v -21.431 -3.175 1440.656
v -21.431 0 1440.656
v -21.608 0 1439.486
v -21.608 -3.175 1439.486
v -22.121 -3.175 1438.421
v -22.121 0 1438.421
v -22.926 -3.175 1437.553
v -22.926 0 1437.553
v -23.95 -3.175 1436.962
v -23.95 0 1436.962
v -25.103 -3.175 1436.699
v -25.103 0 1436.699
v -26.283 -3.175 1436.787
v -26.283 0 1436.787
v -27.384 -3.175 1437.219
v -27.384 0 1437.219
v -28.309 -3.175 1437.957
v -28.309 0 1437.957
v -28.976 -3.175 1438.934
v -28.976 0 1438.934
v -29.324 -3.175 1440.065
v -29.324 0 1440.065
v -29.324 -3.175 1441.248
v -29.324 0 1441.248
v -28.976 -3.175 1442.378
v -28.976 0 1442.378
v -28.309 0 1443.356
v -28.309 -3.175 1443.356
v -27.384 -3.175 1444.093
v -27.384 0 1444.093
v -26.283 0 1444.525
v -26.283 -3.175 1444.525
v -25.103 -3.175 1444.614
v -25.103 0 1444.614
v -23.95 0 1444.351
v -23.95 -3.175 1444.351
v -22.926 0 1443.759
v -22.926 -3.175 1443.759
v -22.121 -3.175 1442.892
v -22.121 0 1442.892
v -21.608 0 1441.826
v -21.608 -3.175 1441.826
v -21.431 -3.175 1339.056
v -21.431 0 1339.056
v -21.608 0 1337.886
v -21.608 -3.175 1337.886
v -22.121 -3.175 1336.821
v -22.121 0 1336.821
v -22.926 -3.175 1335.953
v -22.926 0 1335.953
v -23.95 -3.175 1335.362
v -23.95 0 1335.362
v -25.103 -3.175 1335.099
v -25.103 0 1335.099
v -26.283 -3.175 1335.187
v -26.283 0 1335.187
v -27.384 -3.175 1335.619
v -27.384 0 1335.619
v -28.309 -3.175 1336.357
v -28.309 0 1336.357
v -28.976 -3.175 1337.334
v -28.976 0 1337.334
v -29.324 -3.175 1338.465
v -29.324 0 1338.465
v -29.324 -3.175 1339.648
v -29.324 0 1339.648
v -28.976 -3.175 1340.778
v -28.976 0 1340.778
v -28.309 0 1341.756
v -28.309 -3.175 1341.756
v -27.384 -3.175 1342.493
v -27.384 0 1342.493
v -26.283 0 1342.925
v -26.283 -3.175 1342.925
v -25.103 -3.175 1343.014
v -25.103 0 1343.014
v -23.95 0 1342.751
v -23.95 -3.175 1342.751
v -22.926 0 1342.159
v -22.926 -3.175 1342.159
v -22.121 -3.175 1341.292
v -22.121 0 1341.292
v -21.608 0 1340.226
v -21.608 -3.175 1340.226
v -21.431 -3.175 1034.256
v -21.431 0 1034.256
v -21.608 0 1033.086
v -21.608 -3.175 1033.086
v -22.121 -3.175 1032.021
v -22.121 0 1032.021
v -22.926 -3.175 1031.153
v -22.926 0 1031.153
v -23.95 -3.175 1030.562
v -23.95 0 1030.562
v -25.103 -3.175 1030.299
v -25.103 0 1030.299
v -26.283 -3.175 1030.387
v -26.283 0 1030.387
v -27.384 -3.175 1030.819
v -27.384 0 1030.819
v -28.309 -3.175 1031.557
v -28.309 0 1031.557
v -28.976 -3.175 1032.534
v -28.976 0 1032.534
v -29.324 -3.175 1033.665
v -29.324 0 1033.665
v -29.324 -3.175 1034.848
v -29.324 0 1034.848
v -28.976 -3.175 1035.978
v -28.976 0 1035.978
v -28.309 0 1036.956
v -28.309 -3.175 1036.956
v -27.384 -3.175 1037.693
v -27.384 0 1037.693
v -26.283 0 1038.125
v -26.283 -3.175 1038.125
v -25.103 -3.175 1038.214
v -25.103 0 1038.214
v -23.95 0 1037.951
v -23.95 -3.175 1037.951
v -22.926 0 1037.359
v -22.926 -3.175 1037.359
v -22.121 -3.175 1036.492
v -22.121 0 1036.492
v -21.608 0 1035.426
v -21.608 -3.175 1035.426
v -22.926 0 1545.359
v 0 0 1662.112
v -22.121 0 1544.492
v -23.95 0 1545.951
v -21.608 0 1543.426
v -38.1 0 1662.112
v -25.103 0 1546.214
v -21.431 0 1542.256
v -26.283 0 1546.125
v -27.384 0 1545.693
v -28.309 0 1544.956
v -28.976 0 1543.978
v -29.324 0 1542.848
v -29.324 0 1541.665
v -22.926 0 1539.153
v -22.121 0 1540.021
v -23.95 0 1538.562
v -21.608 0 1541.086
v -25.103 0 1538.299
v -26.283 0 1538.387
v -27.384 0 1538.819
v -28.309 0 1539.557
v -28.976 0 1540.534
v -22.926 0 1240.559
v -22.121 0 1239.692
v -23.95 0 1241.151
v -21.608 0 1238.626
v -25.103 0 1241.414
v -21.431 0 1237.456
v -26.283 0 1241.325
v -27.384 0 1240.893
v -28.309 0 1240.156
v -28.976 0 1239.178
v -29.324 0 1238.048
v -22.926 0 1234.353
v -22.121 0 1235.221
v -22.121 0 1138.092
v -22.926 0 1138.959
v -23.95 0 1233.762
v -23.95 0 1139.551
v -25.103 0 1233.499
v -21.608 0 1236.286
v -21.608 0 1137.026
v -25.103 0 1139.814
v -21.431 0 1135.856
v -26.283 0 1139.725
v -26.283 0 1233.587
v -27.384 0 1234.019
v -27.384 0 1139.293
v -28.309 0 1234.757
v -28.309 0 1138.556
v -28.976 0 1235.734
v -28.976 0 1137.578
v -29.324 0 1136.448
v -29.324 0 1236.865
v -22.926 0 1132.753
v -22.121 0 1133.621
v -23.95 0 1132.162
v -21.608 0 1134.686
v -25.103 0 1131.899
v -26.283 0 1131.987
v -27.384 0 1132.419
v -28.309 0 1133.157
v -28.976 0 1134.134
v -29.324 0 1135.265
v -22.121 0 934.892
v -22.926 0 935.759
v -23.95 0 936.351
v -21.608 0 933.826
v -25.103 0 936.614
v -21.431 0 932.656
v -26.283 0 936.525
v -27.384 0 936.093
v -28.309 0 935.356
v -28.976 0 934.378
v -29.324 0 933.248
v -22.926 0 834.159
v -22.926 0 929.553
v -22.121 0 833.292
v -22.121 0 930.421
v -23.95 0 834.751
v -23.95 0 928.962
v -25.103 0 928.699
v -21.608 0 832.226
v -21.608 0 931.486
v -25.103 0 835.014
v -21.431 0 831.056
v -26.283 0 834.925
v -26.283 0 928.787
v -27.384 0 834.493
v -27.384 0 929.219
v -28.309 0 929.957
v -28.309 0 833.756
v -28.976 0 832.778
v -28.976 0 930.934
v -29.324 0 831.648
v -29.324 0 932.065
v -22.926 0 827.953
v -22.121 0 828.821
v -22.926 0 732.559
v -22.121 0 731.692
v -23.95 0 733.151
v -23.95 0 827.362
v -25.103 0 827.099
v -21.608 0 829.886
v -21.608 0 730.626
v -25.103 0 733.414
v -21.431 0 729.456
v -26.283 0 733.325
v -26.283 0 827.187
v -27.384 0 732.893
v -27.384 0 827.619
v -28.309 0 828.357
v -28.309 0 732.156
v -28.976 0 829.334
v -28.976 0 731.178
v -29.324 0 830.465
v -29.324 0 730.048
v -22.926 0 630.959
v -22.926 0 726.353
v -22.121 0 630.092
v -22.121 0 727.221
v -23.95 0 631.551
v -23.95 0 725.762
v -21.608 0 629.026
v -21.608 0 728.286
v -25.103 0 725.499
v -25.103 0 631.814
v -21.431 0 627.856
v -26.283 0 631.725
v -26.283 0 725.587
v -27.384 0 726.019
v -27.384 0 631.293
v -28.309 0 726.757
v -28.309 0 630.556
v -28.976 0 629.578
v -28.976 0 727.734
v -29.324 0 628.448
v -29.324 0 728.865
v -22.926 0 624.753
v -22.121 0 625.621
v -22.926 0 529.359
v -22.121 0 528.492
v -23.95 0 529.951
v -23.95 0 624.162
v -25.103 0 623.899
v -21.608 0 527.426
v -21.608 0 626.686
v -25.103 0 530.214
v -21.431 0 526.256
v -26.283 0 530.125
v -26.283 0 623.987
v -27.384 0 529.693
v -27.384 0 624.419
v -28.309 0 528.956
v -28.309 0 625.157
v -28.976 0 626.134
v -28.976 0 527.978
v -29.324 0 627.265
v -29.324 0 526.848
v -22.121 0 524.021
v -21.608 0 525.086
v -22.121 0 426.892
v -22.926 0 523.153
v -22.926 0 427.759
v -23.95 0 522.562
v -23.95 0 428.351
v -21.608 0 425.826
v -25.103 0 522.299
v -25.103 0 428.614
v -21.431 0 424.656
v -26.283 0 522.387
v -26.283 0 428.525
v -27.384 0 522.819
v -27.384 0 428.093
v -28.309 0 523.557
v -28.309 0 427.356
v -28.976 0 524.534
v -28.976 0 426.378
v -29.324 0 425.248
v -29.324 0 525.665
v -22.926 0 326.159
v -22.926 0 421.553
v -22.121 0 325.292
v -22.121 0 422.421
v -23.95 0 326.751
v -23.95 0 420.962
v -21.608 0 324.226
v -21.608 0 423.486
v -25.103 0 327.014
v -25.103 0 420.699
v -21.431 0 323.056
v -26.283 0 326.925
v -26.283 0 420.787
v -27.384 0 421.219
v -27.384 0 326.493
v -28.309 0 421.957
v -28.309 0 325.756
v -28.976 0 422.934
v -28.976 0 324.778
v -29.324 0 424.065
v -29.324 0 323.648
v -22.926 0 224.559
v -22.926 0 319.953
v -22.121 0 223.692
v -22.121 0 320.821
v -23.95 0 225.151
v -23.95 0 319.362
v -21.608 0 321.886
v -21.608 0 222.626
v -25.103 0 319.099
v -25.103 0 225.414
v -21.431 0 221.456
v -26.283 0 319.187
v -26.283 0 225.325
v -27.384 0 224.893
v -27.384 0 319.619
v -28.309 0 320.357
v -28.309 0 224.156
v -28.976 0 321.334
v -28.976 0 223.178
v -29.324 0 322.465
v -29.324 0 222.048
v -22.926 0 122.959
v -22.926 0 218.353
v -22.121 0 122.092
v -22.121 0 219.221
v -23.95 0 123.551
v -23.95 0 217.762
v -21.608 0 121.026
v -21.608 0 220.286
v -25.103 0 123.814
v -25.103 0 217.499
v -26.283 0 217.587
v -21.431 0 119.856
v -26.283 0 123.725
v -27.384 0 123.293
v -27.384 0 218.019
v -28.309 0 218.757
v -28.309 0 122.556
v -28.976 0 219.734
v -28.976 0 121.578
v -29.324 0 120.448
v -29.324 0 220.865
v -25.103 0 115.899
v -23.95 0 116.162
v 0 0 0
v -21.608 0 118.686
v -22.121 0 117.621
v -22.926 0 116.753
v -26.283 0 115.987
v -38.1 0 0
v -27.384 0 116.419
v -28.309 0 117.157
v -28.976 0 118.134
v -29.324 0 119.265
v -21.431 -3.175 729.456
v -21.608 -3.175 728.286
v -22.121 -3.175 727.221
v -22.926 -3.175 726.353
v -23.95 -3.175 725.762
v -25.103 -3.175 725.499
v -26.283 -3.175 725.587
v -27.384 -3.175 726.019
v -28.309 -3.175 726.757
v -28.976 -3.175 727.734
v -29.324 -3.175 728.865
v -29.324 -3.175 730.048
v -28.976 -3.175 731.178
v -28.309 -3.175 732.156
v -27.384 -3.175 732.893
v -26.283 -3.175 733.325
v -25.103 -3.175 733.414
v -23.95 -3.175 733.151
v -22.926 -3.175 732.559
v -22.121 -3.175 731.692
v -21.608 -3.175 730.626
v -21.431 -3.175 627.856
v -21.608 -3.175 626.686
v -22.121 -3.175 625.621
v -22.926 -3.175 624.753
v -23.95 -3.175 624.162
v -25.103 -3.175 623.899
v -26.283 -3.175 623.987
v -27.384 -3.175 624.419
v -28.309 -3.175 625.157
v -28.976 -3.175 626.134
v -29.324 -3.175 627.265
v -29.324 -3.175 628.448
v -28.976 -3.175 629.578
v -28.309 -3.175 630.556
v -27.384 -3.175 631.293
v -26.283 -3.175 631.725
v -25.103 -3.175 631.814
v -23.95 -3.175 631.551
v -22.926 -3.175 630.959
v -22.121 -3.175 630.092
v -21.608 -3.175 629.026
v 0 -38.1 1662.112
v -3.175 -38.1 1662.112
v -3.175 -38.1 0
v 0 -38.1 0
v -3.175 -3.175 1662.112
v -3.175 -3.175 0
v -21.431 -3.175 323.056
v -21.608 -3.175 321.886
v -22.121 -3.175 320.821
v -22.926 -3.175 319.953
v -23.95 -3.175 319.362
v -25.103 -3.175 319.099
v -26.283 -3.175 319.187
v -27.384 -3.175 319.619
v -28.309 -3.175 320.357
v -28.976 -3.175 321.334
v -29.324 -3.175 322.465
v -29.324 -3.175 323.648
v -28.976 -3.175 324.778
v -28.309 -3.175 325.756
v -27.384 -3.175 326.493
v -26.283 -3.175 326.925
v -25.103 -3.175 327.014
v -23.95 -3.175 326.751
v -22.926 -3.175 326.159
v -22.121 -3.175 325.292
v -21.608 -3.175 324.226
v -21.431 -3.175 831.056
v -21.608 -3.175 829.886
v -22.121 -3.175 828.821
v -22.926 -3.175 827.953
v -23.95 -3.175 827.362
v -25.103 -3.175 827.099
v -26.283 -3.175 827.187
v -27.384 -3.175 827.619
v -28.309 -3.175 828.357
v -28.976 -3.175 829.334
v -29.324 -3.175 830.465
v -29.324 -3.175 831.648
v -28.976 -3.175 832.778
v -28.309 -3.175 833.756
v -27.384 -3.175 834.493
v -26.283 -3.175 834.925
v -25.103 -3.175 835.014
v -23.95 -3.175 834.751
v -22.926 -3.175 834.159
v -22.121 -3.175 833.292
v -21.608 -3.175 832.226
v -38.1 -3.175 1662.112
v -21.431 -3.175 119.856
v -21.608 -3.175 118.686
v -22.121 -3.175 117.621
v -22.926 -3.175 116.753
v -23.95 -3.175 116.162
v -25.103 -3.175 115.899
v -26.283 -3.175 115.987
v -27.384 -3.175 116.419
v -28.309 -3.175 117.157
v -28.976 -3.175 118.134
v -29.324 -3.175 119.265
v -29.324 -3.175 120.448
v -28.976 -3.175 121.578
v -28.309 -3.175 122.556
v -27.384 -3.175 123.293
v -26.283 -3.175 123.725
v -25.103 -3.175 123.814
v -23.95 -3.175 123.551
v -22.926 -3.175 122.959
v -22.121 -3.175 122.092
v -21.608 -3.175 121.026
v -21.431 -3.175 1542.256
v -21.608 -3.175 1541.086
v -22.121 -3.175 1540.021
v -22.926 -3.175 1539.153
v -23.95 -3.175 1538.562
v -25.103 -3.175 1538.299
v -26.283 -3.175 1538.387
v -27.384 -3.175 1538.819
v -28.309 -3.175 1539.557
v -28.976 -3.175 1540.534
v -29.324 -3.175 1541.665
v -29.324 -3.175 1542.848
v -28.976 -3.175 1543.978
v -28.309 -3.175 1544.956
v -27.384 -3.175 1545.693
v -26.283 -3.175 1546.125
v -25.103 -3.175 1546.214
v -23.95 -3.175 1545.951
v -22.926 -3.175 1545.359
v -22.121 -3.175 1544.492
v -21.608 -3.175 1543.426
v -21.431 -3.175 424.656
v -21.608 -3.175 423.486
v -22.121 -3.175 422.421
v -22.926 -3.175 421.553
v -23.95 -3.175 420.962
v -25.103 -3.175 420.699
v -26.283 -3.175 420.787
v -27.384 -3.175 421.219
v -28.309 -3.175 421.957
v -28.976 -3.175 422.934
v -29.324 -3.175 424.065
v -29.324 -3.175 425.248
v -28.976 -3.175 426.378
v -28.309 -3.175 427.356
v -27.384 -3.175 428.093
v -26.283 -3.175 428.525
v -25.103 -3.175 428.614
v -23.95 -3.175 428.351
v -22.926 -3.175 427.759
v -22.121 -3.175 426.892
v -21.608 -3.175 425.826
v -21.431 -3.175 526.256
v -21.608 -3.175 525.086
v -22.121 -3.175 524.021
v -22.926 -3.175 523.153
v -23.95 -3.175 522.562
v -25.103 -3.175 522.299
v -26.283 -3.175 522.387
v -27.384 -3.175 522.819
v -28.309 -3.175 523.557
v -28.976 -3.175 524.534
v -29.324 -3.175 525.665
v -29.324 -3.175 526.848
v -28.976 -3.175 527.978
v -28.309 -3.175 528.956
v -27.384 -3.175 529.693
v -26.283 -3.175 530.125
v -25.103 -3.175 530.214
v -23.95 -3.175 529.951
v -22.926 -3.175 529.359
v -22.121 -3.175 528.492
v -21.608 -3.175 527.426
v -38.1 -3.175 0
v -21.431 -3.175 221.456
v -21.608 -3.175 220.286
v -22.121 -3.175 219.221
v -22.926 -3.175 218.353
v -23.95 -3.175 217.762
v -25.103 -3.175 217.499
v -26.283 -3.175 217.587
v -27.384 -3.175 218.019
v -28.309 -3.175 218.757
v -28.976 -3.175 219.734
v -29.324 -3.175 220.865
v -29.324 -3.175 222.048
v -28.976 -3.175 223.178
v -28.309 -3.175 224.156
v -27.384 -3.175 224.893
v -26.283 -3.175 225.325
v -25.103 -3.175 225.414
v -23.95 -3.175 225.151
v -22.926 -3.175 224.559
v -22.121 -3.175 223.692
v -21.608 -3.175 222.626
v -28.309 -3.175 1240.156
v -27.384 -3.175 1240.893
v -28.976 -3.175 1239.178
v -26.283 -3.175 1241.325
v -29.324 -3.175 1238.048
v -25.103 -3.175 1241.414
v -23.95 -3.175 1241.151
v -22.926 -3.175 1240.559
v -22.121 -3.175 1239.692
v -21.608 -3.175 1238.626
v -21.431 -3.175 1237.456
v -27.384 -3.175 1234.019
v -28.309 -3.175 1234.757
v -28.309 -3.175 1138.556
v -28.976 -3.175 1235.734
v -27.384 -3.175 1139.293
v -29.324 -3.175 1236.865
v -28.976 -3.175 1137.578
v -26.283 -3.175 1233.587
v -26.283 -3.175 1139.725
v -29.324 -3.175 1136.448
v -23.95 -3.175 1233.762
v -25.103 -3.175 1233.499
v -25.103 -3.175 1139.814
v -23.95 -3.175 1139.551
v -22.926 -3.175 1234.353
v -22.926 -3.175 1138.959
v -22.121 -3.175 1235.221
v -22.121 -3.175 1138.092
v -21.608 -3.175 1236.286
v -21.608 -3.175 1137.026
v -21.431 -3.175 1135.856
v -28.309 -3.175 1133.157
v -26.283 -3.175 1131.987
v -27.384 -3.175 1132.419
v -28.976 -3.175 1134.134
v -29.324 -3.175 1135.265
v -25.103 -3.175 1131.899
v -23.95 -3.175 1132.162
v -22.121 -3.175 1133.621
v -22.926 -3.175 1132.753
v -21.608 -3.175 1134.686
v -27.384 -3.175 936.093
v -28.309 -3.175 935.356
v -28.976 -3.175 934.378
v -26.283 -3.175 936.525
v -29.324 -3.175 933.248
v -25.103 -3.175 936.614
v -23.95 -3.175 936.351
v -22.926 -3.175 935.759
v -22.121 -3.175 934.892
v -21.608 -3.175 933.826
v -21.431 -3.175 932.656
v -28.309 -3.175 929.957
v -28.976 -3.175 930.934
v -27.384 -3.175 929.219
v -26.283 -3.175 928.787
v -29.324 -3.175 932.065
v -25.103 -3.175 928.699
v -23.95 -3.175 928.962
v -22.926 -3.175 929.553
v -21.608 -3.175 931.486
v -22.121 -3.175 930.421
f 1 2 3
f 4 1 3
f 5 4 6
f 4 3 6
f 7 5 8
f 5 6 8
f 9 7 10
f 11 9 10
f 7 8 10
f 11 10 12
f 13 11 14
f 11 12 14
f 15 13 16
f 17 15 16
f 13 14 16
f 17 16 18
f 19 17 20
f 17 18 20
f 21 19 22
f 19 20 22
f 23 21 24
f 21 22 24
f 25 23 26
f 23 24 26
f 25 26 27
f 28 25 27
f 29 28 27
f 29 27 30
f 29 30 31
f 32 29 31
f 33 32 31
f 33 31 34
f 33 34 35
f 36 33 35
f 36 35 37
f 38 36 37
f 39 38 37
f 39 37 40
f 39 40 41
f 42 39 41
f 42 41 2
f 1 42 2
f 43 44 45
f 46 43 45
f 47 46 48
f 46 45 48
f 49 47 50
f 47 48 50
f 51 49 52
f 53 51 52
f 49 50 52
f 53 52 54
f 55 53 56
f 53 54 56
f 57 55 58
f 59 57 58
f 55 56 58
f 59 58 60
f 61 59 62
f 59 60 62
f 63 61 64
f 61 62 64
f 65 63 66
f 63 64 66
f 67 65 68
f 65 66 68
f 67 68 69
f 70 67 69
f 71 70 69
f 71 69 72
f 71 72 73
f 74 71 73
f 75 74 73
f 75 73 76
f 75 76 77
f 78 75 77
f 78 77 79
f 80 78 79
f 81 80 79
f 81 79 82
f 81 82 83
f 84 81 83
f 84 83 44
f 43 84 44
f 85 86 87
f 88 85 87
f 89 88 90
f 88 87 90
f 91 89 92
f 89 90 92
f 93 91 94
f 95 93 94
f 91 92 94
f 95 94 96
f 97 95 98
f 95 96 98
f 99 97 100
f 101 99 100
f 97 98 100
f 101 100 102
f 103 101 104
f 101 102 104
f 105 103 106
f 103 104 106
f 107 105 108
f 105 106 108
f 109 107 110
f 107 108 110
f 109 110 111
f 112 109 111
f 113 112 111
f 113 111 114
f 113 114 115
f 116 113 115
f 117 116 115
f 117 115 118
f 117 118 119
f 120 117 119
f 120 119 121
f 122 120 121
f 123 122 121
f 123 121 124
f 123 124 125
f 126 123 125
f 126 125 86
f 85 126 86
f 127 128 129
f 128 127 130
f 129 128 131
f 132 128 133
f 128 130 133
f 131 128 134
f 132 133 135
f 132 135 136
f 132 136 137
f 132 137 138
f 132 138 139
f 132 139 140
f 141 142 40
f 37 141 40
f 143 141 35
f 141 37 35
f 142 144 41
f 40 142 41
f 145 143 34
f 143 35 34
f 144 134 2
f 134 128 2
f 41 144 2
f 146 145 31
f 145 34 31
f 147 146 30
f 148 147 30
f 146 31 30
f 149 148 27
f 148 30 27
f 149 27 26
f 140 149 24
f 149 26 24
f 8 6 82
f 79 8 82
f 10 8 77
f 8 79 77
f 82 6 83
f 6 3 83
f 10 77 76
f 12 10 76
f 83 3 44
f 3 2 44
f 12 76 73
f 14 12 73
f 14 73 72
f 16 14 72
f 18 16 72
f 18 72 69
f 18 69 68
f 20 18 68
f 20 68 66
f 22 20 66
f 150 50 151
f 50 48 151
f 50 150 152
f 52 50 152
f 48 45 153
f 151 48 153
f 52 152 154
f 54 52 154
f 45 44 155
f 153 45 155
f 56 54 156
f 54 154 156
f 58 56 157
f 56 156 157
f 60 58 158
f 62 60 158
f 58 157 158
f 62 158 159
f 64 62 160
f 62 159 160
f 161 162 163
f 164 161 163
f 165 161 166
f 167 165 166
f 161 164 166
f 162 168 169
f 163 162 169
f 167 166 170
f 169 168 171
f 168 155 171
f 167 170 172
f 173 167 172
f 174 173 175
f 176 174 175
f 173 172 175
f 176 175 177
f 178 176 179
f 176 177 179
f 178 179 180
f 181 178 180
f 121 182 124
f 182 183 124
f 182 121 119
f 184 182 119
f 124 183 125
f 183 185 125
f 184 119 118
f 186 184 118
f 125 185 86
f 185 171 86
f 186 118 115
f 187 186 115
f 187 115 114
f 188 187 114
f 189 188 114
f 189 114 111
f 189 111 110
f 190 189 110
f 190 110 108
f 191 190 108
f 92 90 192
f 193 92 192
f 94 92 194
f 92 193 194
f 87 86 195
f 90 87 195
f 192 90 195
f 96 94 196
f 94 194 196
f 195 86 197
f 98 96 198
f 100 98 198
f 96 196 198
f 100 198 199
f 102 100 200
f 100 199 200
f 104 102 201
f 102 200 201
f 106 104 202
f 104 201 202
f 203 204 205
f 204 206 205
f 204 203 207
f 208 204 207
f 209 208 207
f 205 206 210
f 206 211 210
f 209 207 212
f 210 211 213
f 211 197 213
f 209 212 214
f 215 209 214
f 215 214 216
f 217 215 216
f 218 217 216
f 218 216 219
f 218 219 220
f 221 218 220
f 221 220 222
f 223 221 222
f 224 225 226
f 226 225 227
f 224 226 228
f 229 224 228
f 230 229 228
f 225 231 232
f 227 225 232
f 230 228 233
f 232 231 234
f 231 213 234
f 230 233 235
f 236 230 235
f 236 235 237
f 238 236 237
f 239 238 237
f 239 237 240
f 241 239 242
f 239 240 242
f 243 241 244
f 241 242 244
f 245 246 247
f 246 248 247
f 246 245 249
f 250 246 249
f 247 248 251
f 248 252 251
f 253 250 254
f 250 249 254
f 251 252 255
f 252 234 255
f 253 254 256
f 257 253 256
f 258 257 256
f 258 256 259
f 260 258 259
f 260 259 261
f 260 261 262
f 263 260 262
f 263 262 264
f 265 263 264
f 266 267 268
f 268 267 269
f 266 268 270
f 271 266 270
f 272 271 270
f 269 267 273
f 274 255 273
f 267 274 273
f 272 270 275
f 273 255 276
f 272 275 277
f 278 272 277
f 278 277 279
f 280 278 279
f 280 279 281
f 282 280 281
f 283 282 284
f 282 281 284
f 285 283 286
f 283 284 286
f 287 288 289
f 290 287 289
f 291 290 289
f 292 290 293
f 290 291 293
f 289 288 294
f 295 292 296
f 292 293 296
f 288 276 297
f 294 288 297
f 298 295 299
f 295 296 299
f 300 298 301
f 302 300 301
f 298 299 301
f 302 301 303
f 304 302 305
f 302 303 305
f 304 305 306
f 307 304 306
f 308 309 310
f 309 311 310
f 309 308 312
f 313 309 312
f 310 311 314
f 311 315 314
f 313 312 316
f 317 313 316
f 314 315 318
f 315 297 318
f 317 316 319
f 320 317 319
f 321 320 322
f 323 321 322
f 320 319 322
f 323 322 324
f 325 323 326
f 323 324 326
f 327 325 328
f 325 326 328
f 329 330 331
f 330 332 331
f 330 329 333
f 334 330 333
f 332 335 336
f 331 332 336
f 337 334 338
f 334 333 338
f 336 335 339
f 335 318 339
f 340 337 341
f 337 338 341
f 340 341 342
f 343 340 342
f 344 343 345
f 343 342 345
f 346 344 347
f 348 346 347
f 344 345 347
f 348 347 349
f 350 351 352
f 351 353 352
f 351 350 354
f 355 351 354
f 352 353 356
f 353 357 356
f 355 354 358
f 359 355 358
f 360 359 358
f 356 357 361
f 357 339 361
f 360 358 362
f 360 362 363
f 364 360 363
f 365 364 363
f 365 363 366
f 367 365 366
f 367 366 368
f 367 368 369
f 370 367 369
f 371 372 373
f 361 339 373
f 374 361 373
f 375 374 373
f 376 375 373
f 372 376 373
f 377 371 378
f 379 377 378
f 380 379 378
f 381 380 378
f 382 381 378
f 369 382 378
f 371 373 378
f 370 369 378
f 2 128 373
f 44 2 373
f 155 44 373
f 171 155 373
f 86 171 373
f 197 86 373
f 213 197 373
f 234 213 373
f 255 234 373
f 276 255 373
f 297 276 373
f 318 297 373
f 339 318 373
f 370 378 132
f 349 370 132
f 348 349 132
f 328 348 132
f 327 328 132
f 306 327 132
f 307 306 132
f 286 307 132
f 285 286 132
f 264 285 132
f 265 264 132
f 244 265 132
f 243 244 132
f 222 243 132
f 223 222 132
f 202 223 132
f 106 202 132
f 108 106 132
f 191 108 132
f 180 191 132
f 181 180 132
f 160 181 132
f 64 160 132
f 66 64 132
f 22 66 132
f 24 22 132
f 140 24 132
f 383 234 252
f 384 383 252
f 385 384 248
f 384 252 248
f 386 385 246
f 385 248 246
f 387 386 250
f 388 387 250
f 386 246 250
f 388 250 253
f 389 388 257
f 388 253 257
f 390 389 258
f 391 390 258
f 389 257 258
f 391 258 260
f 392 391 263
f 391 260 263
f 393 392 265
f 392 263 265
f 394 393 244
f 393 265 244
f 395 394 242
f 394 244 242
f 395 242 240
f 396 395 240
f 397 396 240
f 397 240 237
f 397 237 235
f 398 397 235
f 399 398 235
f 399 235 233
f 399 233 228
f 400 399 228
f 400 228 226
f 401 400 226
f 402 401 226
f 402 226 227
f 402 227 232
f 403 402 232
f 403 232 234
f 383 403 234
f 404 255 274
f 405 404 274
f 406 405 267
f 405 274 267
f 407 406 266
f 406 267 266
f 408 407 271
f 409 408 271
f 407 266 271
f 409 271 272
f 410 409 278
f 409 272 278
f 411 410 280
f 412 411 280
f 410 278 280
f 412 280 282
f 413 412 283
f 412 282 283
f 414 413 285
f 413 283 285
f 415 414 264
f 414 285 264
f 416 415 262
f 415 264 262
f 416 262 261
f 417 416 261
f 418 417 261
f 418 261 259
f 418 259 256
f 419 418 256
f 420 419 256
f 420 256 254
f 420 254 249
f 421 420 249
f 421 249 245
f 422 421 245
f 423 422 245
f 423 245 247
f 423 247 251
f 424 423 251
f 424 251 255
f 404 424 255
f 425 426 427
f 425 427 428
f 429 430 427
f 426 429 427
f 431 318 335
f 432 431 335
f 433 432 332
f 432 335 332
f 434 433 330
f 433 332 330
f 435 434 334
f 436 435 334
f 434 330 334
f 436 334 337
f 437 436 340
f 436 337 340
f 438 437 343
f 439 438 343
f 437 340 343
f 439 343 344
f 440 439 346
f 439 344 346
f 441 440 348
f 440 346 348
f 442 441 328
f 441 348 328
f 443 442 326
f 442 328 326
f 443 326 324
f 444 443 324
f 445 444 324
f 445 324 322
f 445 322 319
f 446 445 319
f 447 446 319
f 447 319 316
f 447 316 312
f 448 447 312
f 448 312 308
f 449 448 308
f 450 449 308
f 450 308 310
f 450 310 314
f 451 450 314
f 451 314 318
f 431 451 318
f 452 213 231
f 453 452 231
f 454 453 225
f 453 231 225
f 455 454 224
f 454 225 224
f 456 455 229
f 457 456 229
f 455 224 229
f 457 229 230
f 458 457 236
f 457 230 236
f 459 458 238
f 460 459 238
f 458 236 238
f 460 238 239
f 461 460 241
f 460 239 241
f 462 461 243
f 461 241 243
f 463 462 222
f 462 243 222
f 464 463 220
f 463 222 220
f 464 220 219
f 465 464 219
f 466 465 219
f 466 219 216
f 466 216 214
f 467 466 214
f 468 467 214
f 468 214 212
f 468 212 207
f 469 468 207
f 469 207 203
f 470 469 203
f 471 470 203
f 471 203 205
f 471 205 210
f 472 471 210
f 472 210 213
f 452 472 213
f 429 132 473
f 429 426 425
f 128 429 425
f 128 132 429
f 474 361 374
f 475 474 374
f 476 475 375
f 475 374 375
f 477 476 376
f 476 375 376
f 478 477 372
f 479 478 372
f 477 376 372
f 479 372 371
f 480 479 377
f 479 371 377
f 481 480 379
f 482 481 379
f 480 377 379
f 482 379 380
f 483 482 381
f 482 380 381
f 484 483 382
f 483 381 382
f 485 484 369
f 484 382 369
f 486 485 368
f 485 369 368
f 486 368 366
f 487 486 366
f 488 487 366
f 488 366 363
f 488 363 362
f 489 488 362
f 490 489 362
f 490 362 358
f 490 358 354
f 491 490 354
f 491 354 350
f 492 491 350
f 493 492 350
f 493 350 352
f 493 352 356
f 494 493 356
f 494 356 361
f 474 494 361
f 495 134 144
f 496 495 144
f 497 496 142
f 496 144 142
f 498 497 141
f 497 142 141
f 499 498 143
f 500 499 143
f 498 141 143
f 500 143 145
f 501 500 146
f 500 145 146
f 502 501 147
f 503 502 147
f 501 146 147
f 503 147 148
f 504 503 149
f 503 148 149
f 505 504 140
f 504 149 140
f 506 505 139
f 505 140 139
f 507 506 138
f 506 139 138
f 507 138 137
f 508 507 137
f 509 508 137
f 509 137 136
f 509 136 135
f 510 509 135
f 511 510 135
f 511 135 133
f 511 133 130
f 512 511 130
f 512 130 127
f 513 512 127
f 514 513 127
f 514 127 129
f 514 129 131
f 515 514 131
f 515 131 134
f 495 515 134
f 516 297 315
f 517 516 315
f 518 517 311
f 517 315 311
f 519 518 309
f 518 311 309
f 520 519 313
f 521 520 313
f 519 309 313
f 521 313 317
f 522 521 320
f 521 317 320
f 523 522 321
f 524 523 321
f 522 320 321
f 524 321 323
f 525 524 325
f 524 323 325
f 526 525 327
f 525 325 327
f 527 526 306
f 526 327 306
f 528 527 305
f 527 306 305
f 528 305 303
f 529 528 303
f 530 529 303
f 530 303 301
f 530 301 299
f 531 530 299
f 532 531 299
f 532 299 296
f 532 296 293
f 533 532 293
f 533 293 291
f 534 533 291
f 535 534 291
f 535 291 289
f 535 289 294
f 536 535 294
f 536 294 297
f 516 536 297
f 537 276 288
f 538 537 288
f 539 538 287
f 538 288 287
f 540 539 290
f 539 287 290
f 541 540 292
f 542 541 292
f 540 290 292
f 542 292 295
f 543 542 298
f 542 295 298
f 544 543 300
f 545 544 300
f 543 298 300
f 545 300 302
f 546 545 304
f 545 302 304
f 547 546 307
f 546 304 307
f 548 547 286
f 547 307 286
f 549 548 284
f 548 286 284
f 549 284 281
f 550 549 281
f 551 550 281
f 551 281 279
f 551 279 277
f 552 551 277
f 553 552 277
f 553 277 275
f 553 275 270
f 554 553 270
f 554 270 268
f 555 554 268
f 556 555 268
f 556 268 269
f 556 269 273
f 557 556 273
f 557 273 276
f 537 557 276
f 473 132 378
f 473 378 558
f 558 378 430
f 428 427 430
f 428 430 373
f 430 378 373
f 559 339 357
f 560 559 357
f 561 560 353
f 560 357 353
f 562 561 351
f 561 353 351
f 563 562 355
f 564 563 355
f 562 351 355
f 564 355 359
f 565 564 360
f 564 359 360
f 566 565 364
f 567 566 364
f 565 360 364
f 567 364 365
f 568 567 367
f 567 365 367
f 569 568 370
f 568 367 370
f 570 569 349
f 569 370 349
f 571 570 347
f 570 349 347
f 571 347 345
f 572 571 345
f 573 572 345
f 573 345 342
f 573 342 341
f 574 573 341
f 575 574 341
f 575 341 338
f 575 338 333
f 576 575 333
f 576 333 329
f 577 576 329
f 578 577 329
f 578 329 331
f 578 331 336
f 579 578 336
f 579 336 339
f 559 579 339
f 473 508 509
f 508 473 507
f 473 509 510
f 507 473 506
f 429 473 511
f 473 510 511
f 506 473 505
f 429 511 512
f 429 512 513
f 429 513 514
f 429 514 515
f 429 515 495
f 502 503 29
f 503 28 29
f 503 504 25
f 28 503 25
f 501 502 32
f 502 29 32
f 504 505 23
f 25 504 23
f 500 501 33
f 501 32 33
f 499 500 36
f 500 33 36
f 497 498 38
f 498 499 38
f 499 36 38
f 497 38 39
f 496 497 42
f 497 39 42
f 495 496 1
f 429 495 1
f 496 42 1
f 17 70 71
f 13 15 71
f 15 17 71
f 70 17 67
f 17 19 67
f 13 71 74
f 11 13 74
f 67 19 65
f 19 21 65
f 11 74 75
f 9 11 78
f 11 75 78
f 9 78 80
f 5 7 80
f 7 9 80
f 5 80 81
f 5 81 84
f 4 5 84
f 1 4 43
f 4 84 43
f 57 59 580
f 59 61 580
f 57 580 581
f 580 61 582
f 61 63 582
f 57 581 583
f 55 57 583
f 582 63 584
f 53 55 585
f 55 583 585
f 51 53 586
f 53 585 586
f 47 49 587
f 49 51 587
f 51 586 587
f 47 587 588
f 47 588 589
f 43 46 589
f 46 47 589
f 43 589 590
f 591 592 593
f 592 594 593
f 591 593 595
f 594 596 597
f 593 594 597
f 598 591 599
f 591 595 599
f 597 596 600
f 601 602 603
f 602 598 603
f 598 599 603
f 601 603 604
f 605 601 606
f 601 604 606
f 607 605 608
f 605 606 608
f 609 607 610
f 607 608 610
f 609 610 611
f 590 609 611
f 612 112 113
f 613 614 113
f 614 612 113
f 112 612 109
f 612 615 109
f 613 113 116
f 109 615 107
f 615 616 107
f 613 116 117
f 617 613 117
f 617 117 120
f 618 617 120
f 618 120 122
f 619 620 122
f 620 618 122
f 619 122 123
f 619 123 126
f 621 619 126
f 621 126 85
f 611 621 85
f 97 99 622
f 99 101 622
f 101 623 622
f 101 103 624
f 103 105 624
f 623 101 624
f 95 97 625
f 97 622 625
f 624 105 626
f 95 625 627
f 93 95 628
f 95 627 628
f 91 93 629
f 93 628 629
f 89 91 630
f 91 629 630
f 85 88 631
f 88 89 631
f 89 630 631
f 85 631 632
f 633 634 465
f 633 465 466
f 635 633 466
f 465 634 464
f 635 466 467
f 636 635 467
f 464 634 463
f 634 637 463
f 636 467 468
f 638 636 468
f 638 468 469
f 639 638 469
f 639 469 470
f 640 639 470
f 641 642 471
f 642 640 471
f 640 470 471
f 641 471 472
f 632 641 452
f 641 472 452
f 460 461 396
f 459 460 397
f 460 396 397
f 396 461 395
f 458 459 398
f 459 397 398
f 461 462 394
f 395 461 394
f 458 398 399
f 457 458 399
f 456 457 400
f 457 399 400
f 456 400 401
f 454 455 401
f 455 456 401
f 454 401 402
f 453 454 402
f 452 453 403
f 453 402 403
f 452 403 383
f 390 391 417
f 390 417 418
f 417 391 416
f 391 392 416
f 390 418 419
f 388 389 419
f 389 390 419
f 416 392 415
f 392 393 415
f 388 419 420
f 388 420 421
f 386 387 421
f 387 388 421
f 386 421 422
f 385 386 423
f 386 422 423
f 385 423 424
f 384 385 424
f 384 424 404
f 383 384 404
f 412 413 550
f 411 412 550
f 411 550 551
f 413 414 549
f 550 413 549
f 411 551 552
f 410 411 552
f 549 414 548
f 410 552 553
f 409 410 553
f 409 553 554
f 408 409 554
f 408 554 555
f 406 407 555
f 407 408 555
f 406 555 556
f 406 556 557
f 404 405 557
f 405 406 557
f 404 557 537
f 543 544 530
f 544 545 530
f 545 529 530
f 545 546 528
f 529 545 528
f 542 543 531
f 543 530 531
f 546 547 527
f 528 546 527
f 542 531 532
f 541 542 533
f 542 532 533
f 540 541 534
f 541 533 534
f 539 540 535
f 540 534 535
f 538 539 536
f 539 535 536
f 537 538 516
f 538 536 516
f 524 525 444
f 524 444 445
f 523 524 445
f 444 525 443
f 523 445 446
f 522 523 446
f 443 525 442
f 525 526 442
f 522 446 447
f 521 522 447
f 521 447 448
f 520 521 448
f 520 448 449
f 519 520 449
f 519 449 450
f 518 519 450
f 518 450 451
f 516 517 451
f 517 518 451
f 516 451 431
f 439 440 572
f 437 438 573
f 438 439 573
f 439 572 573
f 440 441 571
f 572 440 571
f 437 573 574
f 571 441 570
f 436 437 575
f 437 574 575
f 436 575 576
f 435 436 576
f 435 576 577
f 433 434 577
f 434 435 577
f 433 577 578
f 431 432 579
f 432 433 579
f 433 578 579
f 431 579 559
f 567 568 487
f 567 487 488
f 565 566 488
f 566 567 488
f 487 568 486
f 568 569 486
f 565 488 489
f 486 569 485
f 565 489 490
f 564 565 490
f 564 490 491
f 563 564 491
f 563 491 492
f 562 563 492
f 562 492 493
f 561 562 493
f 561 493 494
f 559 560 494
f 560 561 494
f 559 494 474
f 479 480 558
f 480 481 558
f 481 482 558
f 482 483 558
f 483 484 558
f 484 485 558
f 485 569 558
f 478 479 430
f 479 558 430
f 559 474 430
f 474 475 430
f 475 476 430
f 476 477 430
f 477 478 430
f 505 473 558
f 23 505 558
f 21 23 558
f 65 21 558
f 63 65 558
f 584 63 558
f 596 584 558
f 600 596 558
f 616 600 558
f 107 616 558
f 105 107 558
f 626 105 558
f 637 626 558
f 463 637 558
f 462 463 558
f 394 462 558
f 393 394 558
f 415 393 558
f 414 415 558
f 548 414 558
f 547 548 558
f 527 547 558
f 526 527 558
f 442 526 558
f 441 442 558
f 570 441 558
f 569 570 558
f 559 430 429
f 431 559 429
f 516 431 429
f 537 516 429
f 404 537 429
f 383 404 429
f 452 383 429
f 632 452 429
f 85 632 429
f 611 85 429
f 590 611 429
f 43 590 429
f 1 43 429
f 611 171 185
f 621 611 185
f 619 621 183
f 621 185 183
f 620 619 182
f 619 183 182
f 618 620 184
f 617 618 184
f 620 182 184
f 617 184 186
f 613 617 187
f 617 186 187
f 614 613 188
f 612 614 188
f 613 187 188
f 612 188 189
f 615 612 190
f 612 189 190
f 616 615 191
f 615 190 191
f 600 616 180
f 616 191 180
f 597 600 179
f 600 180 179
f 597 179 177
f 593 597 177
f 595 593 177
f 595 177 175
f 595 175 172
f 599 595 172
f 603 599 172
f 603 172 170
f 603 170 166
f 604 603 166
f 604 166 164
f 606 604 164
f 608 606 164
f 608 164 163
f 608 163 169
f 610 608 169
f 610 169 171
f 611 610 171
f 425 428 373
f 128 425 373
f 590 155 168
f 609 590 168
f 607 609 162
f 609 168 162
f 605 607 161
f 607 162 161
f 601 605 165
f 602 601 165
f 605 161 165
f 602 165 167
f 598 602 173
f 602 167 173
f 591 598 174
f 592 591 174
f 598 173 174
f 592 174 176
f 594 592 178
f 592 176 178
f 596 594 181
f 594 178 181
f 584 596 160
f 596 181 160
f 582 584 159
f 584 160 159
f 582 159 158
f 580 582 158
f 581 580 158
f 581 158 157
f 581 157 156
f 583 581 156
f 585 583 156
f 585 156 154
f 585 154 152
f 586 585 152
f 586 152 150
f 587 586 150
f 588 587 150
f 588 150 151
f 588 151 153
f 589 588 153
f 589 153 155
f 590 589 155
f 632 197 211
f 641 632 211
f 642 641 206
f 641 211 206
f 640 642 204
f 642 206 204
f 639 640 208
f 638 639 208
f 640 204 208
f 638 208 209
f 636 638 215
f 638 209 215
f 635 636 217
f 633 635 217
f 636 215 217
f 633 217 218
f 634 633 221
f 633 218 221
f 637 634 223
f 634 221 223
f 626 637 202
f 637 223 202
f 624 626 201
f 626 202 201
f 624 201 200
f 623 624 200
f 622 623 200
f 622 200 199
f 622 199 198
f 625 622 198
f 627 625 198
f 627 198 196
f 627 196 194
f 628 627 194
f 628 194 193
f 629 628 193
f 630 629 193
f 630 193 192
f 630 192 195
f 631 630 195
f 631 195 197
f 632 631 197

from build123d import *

# Parameters (mm, degrees)
BOSS_EXTRUDE1_DEPTH = 1662.1125
SKETCH4_R           = 3.96875
CUT_EXTRUDE3_DEPTH  = 44.45
LPATTERN1_COUNT     = 15
LPATTERN1_PITCH     = 101.6


with BuildPart() as part:
    # Sketch1 → Boss-Extrude1 (new body)
    with BuildSketch(Plane.XY):
        Polygon((0, 0), (-38.1, 0), (-38.1, -3.175), (-3.175, -3.175), (-3.175, -38.1), (0, -38.1), align=None)
    extrude(amount=BOSS_EXTRUDE1_DEPTH)

    # Sketch4 → Cut-Extrude3 (cut)
    with BuildSketch(Plane(origin=(10.670100368, 3.175, 817.757022881), x_dir=(1, 0, 0), z_dir=(0, 1, 0))):
        with Locations((-36.070100368, 697.900772881)):
            Circle(SKETCH4_R)
    cut_extrude3 = extrude(amount=-CUT_EXTRUDE3_DEPTH, mode=Mode.SUBTRACT)

    # LPattern1: Cut-Extrude3 ×15
    with Locations(*[(0, 0, i * LPATTERN1_PITCH) for i in range(1, LPATTERN1_COUNT)]):
        add(cut_extrude3, mode=Mode.SUBTRACT)


solid = part.part
